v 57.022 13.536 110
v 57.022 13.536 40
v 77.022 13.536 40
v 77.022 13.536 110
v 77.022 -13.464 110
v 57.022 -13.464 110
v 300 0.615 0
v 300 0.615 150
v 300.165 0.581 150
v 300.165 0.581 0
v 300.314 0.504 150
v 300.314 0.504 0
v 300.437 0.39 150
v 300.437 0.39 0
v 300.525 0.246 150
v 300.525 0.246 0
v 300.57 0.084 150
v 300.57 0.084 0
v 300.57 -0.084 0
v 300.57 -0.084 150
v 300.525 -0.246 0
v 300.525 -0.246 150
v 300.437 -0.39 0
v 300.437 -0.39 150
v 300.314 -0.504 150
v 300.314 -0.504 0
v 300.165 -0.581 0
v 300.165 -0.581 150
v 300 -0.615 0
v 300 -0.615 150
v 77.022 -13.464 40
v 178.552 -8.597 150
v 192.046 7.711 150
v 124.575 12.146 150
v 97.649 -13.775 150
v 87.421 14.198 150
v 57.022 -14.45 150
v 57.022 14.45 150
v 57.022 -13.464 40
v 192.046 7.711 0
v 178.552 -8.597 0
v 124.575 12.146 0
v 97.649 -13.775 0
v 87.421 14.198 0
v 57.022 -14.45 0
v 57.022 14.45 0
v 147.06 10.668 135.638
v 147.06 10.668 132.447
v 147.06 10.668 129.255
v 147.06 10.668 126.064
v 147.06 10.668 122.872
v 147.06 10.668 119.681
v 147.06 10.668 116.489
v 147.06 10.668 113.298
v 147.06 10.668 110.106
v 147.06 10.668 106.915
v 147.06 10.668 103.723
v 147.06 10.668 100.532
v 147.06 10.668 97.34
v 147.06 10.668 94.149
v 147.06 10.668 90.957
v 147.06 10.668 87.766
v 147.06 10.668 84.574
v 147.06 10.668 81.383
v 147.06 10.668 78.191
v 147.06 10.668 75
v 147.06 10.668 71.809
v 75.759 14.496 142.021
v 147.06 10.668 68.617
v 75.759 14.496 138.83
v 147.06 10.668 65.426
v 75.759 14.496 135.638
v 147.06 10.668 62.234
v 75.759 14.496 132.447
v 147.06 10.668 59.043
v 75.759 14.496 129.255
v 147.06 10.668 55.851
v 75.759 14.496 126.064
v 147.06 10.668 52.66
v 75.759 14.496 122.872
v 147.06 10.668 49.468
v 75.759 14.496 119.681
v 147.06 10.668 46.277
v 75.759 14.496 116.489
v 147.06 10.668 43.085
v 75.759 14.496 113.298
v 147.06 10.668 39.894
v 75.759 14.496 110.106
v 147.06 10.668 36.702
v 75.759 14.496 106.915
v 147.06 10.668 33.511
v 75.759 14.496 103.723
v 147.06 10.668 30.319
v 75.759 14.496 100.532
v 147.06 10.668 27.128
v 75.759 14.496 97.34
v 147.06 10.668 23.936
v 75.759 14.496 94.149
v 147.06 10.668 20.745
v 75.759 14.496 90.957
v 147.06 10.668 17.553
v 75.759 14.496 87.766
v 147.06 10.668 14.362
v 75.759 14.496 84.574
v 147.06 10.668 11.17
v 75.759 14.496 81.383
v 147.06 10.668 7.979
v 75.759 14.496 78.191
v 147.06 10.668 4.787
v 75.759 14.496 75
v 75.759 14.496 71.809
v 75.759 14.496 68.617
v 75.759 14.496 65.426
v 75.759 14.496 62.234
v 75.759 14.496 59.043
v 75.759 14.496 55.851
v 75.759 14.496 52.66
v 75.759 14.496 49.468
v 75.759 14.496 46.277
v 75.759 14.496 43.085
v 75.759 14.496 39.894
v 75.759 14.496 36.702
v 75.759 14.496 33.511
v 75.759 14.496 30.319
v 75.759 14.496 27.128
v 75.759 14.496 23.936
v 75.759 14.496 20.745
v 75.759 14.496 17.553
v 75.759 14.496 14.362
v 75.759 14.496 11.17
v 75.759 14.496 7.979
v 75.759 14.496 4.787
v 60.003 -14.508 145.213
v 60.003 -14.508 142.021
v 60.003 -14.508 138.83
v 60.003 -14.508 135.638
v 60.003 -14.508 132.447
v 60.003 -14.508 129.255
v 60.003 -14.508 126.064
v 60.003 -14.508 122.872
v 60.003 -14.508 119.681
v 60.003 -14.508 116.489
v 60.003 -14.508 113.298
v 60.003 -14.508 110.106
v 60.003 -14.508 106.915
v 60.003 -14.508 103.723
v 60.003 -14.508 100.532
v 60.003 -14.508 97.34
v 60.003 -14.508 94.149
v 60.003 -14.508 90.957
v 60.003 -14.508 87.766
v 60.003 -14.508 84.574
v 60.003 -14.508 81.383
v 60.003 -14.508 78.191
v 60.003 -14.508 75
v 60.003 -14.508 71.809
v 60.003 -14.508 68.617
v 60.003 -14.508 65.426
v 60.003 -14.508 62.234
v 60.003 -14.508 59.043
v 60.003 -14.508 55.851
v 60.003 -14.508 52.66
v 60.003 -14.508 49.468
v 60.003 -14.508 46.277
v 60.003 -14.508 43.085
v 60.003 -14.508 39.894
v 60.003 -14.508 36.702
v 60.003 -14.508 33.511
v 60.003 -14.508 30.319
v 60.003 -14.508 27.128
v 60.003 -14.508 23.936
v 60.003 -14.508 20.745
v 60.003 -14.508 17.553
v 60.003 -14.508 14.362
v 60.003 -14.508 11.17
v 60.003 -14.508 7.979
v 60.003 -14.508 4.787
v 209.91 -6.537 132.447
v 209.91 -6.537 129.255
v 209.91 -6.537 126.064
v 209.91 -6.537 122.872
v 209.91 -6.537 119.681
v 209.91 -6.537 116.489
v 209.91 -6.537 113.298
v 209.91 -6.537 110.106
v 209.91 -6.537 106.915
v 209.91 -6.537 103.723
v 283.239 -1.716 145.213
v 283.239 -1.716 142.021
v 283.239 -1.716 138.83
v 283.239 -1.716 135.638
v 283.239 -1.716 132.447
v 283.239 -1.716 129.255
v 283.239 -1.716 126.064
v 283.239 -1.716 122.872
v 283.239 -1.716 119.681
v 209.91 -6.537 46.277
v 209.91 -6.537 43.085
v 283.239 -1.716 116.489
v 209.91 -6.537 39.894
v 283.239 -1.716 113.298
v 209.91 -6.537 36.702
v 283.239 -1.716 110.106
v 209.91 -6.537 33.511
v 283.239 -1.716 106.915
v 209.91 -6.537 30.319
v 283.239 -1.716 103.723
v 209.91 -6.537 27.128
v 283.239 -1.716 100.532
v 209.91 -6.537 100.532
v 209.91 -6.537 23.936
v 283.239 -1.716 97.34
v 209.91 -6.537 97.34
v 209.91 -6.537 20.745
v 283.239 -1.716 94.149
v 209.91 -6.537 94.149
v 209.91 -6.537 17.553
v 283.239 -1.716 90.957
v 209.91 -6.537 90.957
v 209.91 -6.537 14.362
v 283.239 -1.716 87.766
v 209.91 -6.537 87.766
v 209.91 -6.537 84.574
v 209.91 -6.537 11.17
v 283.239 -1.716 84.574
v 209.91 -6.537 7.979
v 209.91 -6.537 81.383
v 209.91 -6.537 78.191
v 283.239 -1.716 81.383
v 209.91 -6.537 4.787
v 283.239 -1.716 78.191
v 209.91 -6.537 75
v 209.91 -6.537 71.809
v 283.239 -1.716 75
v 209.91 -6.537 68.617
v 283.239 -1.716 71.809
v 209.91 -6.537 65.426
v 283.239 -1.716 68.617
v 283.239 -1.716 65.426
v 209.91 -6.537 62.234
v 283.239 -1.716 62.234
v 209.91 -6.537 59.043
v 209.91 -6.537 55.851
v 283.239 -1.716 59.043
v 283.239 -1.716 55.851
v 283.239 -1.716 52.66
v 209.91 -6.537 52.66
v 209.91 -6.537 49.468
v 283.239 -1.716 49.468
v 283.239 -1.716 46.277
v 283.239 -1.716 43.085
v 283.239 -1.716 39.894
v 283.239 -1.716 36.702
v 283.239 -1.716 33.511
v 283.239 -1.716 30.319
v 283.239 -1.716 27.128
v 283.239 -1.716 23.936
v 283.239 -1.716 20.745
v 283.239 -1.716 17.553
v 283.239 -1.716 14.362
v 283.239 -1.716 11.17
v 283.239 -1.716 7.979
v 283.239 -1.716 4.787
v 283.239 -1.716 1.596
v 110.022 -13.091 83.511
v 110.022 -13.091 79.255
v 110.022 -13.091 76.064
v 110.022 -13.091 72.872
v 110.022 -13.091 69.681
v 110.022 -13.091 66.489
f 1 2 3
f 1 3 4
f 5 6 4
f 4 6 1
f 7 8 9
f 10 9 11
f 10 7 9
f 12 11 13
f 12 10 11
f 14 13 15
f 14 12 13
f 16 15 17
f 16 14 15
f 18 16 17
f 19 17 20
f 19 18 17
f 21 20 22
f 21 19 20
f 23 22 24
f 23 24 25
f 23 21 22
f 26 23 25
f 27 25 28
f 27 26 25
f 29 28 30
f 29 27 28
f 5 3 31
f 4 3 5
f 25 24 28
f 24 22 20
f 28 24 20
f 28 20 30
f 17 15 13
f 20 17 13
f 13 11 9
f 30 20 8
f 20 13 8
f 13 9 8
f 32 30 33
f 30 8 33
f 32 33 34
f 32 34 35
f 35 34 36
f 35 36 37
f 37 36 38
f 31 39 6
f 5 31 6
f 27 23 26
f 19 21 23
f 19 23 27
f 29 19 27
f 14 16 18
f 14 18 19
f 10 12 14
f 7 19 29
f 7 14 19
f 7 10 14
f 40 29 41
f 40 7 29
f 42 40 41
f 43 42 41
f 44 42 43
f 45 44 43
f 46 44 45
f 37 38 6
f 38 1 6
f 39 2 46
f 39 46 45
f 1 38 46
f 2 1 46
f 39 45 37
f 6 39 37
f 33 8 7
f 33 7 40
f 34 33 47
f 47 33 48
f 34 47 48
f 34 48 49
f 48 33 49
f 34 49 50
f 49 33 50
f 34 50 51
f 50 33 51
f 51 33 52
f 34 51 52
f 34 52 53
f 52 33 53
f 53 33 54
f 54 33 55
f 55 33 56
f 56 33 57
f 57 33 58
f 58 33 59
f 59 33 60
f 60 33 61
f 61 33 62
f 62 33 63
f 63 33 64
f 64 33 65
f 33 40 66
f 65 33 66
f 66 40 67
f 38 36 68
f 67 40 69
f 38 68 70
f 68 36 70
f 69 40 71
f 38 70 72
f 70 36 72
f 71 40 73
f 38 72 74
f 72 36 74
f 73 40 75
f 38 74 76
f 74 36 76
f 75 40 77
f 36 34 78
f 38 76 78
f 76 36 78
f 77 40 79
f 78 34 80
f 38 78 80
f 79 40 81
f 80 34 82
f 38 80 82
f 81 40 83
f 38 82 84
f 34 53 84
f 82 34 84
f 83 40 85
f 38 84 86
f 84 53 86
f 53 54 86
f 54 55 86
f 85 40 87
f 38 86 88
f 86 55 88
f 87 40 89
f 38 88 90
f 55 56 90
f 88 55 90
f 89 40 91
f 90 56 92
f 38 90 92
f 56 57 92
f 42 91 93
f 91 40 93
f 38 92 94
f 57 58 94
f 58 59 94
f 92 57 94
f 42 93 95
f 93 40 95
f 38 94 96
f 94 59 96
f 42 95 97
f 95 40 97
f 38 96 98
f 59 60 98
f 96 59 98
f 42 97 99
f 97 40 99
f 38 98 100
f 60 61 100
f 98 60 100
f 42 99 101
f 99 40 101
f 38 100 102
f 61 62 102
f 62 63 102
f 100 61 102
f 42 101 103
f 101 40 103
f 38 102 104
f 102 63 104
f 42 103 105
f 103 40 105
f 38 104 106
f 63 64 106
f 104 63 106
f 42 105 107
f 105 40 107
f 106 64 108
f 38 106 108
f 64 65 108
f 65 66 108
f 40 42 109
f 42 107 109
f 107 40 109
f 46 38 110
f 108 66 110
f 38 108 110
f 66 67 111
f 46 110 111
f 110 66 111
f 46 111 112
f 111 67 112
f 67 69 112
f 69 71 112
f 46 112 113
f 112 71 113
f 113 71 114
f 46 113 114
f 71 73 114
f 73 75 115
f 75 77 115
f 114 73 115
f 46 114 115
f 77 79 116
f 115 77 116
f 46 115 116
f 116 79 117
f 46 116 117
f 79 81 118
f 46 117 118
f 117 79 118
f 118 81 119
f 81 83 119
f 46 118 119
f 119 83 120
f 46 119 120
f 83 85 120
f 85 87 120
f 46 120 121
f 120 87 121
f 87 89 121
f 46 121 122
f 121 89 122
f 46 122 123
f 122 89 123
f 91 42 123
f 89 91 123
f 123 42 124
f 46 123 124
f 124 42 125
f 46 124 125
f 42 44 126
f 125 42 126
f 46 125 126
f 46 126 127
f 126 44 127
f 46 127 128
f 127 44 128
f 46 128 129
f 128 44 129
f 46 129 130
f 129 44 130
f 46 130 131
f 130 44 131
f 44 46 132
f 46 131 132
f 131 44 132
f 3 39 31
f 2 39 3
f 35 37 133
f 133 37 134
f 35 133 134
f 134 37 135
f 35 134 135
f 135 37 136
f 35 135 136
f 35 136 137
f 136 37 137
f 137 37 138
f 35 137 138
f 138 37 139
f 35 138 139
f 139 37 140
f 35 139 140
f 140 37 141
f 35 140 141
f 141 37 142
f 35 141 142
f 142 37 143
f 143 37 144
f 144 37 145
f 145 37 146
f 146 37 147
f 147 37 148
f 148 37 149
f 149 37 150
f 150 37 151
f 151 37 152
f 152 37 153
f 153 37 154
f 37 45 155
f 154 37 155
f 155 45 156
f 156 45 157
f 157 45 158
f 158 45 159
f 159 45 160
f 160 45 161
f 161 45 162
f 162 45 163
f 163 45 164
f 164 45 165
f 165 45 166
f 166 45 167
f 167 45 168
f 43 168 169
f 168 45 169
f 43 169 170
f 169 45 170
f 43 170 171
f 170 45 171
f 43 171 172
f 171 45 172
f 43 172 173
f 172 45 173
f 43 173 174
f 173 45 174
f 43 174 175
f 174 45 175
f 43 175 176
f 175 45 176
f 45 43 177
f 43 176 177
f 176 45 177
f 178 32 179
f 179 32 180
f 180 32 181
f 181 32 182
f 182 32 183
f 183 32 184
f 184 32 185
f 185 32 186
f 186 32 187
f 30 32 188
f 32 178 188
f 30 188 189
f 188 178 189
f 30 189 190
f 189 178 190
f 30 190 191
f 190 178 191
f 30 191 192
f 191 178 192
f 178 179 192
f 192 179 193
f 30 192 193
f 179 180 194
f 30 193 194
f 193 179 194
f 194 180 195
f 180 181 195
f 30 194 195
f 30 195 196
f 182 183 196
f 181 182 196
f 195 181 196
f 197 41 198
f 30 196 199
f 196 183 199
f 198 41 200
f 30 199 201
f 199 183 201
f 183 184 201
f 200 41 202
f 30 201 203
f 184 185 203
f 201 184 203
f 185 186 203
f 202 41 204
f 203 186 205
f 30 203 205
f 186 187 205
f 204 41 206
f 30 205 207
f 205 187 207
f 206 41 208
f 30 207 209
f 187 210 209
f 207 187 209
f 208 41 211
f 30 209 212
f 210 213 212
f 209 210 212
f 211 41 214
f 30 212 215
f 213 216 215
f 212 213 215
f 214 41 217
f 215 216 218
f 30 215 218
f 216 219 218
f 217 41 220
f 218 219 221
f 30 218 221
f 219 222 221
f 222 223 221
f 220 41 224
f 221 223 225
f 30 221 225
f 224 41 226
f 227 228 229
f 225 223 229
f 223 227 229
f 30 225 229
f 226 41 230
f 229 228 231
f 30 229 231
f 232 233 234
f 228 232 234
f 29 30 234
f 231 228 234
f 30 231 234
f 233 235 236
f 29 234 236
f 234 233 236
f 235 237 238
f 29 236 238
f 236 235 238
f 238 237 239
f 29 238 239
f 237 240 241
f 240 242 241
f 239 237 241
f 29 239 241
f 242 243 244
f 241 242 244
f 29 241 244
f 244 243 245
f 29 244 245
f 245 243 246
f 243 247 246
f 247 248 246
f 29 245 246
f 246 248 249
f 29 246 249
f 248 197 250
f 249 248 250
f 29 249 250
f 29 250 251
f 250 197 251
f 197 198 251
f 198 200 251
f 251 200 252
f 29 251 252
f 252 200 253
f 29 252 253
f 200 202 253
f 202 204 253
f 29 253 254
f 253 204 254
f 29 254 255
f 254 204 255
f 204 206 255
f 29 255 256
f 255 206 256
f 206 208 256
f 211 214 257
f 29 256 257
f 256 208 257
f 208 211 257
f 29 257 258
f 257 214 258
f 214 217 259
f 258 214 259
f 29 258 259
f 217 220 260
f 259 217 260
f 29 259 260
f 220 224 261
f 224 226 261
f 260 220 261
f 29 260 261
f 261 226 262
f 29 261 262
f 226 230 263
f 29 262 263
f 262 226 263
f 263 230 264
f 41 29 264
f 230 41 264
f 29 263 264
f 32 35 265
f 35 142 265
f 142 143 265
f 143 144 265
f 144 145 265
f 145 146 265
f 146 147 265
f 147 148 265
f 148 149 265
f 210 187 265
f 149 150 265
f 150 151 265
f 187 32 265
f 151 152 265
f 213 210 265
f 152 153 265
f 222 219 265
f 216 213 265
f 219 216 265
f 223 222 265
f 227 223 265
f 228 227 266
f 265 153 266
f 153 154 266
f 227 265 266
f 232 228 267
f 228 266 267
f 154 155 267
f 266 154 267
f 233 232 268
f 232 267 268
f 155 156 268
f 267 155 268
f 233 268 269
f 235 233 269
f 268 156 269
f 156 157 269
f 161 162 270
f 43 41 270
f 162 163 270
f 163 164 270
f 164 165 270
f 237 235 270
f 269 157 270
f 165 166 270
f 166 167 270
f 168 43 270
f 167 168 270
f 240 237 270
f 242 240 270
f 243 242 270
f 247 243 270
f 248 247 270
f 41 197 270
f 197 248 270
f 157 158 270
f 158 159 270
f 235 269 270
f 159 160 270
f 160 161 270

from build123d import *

# Parameters (mm, degrees)
BOSS_EXTRU_1_DEPTH             = 150
FRACTIONNER1_SURFACE_1_BACK    = 338.186
FRACTIONNER1_SURFACE_1_DEPTH   = 676.372
FRACTIONNER1_SURFACE_2_BACK    = 338.186
FRACTIONNER1_SURFACE_2_DEPTH   = 676.372
CORPS_SUPPRIMER_GARDER_1_DEPTH = 150
ESQUISSE4_W                    = 70
ESQUISSE4_H                    = 27
ENL_V_MAT_EXTRU_1_DEPTH        = 20


with BuildPart() as part:
    # Esquisse1 → Boss.-Extru.1 (new body)
    with BuildSketch(Plane.XY):
        with BuildLine():
            ThreePointArc((300, 0.615), (300.57616321, 0), (300, -0.615))
            add(Edge.make_bspline(
                [(300, 0.615), (297.904984084, 0.751757543), (292.317834147, 1.116473101), (283.239167486, 1.717548993), (272.763851073, 2.401734129), (262.289009769, 3.093148372), (251.814135815, 3.784066551), (241.337843931, 4.4686253), (230.862161266, 5.161453759), (220.385838201, 5.845538162), (209.911154414, 6.538349242), (199.435845553, 7.222650253), (188.961161962, 7.915464365), (178.484838114, 8.599536639), (168.010154067, 9.292344726), (157.534847028, 9.976669832), (147.06015641, 10.669390538), (136.583858848, 11.353812357), (126.108081003, 12.045381523), (115.628989204, 12.734847578), (106.544413863, 13.318771764), (98.151476207, 13.759261663), (91.156562369, 14.075053545), (83.459091103, 14.332671008), (76.809762769, 14.494266326), (71.208103955, 14.553043896), (68.057010771, 14.564841535), (65.955984612, 14.566136146), (63.504942858, 14.548307662), (58.950185243, 14.50722741), (52.639372933, 14.342178025), (45.976395003, 14.041169691), (40.714278866, 13.694270896), (36.853148612, 13.371585869), (33.690528003, 13.066756335), (30.525686443, 12.713592883), (27.357424626, 12.304603807), (23.829347777, 11.773145061), (20.293449043, 11.155810812), (16.752613493, 10.405038809), (13.91014568, 9.695268378), (11.411898729, 8.968942676), (9.247069544, 8.239122328), (7.047101664, 7.371563533), (5.204368253, 6.469298236), (3.704406867, 5.566960218), (2.492406306, 4.671764118), (0.823776108, 3.084389444), (-0.563560511, 0), (0.823776108, -3.084389444), (2.492406306, -4.671764118), (3.704406867, -5.566960218), (5.204368253, -6.469298236), (7.047101664, -7.371563533), (9.247069544, -8.239122328), (11.411898729, -8.968942676), (13.91014568, -9.695268378), (16.752613493, -10.405038809), (20.293449043, -11.155810812), (23.829347777, -11.773145061), (27.357424626, -12.304603807), (30.525686443, -12.713592883), (33.690528003, -13.066756335), (36.853148612, -13.371585869), (40.714278866, -13.694270896), (45.976395003, -14.041169691), (52.639372933, -14.342178025), (58.950185243, -14.50722741), (63.504942858, -14.548307662), (65.955984612, -14.566136146), (68.057010771, -14.564841535), (71.208103955, -14.553043896), (76.809762769, -14.494266326), (83.459091103, -14.332671008), (91.156562369, -14.075053545), (98.151476207, -13.759261663), (106.544413863, -13.318771764), (115.628989204, -12.734847578), (126.108081003, -12.045381523), (136.583858848, -11.353812357), (147.06015641, -10.669390538), (157.534847028, -9.976669832), (168.010154067, -9.292344726), (178.484838114, -8.599536639), (188.961161962, -7.915464365), (199.435845553, -7.222650253), (209.911154414, -6.538349242), (220.385838201, -5.845538162), (230.862161266, -5.161453759), (241.337843931, -4.4686253), (251.814135815, -3.784066551), (262.289009769, -3.093148372), (272.763851073, -2.401734129), (283.239167486, -1.717548993), (292.317834147, -1.116473101), (297.904984084, -0.751757543), (300, -0.615)],
                knots=[0, 0, 0, 0, 0.010331767, 0.027553552, 0.044775014, 0.061991889, 0.079213674, 0.096435137, 0.113656922, 0.130878384, 0.14810017, 0.165316721, 0.182538507, 0.199759969, 0.216981754, 0.234198306, 0.251420091, 0.268641554, 0.285863339, 0.303084802, 0.320322147, 0.330661097, 0.344443905, 0.354779244, 0.368562092, 0.377174559, 0.382346694, 0.384069086, 0.387513926, 0.39440881, 0.406484298, 0.418578438, 0.427229264, 0.432434172, 0.437645264, 0.442864528, 0.448104782, 0.453364927, 0.460421621, 0.465764879, 0.471174038, 0.474835156, 0.478565394, 0.482412615, 0.486466494, 0.488643966, 0.491021881, 0.493857902, 0.5, 0.506142098, 0.508978119, 0.511356034, 0.513533506, 0.517587385, 0.521434606, 0.525164844, 0.528825962, 0.534235121, 0.539578379, 0.546635073, 0.551895218, 0.557135472, 0.562354736, 0.567565828, 0.572770736, 0.581421562, 0.593515702, 0.60559119, 0.612486074, 0.615930914, 0.617653306, 0.622825441, 0.631437908, 0.645220756, 0.655556095, 0.669338903, 0.679677853, 0.696915198, 0.714136661, 0.731358446, 0.748579909, 0.765801694, 0.783018246, 0.800240031, 0.817461493, 0.834683279, 0.85189983, 0.869121616, 0.886343078, 0.903564863, 0.920786326, 0.938008111, 0.955224986, 0.972446448, 0.989668233, 1, 1, 1, 1], degree=3))
        make_face()
    extrude(amount=BOSS_EXTRU_1_DEPTH)


with BuildPart() as body_2:
    # Fractionner1: the piece behind the surface
    add(part.part)
    # Fractionner1 surface: a surface, the sketch's curves swept straight by 676.372 mm
    with BuildLine(Plane.XY.offset(150).offset(-FRACTIONNER1_SURFACE_1_BACK), mode=Mode.PRIVATE) as fractionner1_surface_1_path:
        Line((57.022091302, 21.120873497), (57.022091302, -26.585419846))
    fractionner1_surface_1 = Shell.extrude(fractionner1_surface_1_path.wire(), (0 * FRACTIONNER1_SURFACE_1_DEPTH, 0 * FRACTIONNER1_SURFACE_1_DEPTH, 1 * FRACTIONNER1_SURFACE_1_DEPTH))
    split(bisect_by=fractionner1_surface_1, keep=Keep.BOTTOM)

    # Corps-Supprimer/Garder 1: read off the stored shape, not the designer's step
    # Corps-Supprimer/Garder 1 outline → Corps-Supprimer/Garder 1 (cut)
    with BuildSketch(Plane.XY):
        with BuildLine():
            Line((57.022091311, -14.449616285), (57.022091311, 14.449616285))
            add(Edge.make_bspline(
                [(57.022091311, 14.449616285), (55.562497262, 14.414805897), (51.646493469, 14.297323458), (45.976395003, 14.041169691), (40.714278866, 13.694270896), (36.853148612, 13.371585869), (33.690528003, 13.066756335), (30.525686443, 12.713592883), (27.357424626, 12.304603807), (23.829347777, 11.773145061), (20.293449043, 11.155810812), (16.752613493, 10.405038809), (13.91014568, 9.695268378), (11.411898729, 8.968942676), (9.247069544, 8.239122328), (7.047101664, 7.371563533), (5.204368253, 6.469298236), (3.704406867, 5.566960218), (2.492406306, 4.671764118), (0.823776108, 3.084389444), (-0.563560511, 0), (0.823776108, -3.084389444), (2.492406306, -4.671764118), (3.704406867, -5.566960218), (5.204368253, -6.469298236), (7.047101664, -7.371563533), (9.247069544, -8.239122328), (11.411898729, -8.968942676), (13.91014568, -9.695268378), (16.752613493, -10.405038809), (20.293449043, -11.155810812), (23.829347777, -11.773145061), (27.357424626, -12.304603807), (30.525686443, -12.713592883), (33.690528003, -13.066756335), (36.853148612, -13.371585869), (40.714278866, -13.694270896), (45.976395003, -14.041169691), (51.646493469, -14.297323458), (55.562497262, -14.414805897), (57.022091311, -14.449616285)],
                knots=[0.399299529, 0.399299529, 0.399299529, 0.399299529, 0.406484298, 0.418578438, 0.427229264, 0.432434172, 0.437645264, 0.442864528, 0.448104782, 0.453364927, 0.460421621, 0.465764879, 0.471174038, 0.474835156, 0.478565394, 0.482412615, 0.486466494, 0.488643966, 0.491021881, 0.493857902, 0.5, 0.506142098, 0.508978119, 0.511356034, 0.513533506, 0.517587385, 0.521434606, 0.525164844, 0.528825962, 0.534235121, 0.539578379, 0.546635073, 0.551895218, 0.557135472, 0.562354736, 0.567565828, 0.572770736, 0.581421562, 0.593515702, 0.600700471, 0.600700471, 0.600700471, 0.600700471], degree=3))
        make_face()
    extrude(amount=CORPS_SUPPRIMER_GARDER_1_DEPTH, mode=Mode.SUBTRACT)


with BuildPart() as part_1:
    add(part.part)

    # Fractionner1: split by a surface, the side it looks to stays
    # Fractionner1 surface: a surface, the sketch's curves swept straight by 676.372 mm
    with BuildLine(Plane.XY.offset(150).offset(-FRACTIONNER1_SURFACE_2_BACK), mode=Mode.PRIVATE) as fractionner1_surface_2_path:
        Line((57.022091302, 21.120873497), (57.022091302, -26.585419846))
    fractionner1_surface_2 = Shell.extrude(fractionner1_surface_2_path.wire(), (0 * FRACTIONNER1_SURFACE_2_DEPTH, 0 * FRACTIONNER1_SURFACE_2_DEPTH, 1 * FRACTIONNER1_SURFACE_2_DEPTH))
    split(bisect_by=fractionner1_surface_2, keep=Keep.TOP)

    # Esquisse4 → Enlèv. mat.-Extru.1 (cut)
    with BuildSketch(Plane.ZY.offset(-57.022091302)):
        with Locations((75, 0.035962925)):
            Rectangle(ESQUISSE4_W, ESQUISSE4_H)
    extrude(amount=-ENL_V_MAT_EXTRU_1_DEPTH, mode=Mode.SUBTRACT)


solid = part_1.part
